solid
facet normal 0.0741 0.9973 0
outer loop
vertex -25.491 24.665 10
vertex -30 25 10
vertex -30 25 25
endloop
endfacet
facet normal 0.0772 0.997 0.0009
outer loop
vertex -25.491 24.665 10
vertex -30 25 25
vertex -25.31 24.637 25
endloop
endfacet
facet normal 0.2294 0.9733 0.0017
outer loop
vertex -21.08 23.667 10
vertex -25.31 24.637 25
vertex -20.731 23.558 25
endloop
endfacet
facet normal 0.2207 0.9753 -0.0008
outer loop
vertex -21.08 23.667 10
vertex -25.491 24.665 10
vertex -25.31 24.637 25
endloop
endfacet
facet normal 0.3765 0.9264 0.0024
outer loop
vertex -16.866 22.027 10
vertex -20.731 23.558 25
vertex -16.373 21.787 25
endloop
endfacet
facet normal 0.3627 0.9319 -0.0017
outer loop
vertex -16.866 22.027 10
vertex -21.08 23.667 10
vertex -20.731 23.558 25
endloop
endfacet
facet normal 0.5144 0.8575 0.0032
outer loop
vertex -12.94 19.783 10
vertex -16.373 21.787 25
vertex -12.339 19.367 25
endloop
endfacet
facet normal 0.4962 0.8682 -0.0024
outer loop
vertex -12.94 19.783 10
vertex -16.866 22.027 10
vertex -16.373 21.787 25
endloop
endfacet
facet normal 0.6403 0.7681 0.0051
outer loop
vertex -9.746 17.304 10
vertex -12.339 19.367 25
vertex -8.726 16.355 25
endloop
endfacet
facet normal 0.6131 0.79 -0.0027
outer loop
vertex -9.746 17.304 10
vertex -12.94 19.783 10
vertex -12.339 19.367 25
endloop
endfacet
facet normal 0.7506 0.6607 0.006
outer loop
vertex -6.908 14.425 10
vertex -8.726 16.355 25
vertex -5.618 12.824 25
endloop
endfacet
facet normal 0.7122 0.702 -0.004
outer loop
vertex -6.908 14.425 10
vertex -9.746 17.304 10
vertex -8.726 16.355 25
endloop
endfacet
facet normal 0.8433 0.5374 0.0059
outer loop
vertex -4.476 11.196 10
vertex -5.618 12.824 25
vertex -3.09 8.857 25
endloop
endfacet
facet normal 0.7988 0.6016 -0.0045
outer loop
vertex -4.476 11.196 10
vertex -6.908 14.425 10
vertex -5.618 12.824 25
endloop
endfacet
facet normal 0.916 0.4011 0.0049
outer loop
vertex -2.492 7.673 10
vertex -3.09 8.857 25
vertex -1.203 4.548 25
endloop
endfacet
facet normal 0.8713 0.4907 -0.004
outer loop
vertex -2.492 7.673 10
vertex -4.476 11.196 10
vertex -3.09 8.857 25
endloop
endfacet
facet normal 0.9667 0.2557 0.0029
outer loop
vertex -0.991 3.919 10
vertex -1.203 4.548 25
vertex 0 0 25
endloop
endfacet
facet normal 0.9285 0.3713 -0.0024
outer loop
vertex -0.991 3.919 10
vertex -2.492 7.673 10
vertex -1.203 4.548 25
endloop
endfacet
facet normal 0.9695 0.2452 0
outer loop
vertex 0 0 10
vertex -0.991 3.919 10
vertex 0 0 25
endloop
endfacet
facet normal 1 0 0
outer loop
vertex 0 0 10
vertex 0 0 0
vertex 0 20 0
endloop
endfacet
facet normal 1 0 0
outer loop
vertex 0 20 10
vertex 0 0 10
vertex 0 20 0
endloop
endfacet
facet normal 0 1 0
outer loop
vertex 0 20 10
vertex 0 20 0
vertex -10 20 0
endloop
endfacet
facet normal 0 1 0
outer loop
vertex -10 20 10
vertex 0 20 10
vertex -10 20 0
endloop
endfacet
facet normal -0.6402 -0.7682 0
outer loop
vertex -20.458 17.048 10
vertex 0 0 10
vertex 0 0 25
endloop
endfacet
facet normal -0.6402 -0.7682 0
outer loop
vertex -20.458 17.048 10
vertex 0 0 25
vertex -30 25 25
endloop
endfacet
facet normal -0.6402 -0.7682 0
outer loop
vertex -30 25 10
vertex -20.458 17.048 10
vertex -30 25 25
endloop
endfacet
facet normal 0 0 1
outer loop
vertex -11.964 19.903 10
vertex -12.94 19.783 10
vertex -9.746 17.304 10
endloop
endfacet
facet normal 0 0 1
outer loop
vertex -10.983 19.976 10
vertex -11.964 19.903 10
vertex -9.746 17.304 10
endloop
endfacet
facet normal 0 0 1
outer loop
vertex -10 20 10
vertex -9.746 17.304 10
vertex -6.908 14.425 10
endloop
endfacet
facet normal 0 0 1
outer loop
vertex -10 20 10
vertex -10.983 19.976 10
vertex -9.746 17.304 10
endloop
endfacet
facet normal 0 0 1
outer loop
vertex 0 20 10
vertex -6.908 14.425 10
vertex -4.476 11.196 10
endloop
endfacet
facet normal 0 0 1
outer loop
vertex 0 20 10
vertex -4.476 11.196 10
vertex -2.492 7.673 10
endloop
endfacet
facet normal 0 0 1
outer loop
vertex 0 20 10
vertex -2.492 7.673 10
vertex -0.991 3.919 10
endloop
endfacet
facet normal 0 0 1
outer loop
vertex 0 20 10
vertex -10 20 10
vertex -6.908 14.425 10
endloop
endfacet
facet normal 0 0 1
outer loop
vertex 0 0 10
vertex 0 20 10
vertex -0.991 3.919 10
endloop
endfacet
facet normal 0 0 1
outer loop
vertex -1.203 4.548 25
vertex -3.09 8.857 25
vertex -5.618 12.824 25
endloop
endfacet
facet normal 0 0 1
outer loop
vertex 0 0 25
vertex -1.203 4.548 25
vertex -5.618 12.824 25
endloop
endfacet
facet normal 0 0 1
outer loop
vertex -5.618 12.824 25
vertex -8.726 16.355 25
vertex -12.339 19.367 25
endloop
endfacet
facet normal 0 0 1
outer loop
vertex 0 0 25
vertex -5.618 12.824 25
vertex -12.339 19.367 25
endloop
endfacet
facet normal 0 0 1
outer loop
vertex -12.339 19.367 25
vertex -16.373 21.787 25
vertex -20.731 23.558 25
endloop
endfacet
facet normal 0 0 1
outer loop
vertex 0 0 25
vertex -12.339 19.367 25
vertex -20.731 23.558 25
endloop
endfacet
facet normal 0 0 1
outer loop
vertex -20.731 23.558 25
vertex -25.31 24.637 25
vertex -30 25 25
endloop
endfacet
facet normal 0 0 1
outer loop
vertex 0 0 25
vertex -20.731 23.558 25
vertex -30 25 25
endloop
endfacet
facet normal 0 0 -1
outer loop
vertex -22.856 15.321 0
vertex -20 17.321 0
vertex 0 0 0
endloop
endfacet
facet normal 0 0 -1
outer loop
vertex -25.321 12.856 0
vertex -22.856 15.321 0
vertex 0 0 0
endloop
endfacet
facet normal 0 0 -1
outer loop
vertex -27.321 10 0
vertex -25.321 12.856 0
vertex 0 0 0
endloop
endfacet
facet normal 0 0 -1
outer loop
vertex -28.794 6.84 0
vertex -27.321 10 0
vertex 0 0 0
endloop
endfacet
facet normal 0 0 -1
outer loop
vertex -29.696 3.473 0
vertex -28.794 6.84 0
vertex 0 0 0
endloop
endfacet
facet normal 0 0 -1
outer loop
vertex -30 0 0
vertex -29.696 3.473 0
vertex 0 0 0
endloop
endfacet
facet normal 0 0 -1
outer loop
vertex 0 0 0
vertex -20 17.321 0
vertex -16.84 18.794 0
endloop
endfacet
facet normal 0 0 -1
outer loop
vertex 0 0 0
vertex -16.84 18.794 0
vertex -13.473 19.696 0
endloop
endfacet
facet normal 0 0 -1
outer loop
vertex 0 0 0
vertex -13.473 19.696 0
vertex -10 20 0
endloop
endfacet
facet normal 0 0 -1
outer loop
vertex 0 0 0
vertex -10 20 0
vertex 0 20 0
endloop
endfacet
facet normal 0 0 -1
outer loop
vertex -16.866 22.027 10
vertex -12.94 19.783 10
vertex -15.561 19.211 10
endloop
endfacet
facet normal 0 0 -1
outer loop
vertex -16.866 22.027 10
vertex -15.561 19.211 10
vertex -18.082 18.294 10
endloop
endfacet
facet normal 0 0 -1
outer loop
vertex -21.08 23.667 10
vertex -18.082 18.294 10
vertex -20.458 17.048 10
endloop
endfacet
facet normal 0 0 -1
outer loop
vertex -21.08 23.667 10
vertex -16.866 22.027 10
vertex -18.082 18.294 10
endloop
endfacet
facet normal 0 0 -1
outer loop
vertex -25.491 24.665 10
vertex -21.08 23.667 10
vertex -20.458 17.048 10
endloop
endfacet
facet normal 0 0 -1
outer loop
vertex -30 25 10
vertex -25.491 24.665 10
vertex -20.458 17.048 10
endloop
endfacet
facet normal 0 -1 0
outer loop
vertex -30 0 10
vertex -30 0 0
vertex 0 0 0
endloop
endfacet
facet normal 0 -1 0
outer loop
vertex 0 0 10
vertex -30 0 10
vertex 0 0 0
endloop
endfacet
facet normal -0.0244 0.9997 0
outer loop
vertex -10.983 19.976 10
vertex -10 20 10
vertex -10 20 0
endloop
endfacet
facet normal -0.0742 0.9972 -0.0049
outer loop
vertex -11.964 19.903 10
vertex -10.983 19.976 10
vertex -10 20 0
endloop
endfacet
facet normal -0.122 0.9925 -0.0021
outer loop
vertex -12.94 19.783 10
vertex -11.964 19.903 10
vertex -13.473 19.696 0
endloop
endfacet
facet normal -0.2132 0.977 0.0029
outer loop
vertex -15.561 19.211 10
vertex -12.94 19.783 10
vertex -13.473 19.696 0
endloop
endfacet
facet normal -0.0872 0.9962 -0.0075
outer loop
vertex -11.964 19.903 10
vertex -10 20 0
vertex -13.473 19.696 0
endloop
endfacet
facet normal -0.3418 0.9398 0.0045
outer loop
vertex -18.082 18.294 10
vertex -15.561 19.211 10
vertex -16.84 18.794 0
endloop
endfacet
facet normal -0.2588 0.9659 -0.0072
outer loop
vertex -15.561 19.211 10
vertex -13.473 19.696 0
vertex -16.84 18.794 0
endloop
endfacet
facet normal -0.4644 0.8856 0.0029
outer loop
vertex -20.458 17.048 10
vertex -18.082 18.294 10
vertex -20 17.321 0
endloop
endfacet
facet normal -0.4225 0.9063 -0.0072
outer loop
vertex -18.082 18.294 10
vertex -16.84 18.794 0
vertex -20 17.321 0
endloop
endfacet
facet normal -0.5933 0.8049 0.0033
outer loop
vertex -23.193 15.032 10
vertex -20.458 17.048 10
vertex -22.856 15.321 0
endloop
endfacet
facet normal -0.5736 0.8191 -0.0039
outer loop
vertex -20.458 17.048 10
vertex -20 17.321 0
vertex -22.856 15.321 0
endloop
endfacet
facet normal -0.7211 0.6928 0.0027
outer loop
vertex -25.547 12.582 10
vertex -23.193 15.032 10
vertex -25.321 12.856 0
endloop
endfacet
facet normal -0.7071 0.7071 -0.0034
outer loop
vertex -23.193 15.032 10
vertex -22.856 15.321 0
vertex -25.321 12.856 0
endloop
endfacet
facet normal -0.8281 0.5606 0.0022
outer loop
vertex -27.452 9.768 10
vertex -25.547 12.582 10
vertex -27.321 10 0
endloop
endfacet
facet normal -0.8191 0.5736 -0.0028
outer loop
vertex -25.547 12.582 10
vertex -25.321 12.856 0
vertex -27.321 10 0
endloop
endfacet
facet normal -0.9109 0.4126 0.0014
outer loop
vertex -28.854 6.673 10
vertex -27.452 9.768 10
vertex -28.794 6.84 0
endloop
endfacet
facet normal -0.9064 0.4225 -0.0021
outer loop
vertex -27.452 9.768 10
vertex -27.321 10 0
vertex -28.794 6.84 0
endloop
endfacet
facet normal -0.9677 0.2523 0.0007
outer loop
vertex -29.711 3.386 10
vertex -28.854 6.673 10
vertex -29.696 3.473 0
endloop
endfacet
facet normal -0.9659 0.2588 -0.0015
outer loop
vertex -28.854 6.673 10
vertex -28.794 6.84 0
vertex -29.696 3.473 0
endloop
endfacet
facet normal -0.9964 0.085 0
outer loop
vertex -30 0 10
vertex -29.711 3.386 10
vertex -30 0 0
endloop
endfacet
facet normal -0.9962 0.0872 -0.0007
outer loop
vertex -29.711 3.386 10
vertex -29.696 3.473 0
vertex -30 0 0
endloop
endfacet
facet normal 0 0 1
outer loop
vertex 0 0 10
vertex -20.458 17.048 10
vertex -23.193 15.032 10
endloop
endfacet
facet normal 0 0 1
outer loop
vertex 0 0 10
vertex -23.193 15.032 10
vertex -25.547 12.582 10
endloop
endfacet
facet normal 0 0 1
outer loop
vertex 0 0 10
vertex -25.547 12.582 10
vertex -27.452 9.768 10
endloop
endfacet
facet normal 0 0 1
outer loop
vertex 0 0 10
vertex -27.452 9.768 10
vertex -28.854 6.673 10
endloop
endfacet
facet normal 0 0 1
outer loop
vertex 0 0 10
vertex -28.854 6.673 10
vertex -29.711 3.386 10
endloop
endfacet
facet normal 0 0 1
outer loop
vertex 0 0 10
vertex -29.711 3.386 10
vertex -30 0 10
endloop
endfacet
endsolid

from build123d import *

# Parameters (mm, degrees)
BOSS_EXTRUDE1_DEPTH = 10
BOSS_EXTRUDE2_DEPTH = 15


with BuildPart() as part:
    # Sketch1 → Boss-Extrude1 (new body)
    with BuildSketch(Plane.XY):
        with BuildLine():
            Line((-30, 0), (0, 0))
            Line((0, 0), (0, 20))
            Line((0, 20), (-10, 20))
            ThreePointArc((-10, 20), (-24.142135624, 14.142135624), (-30, 0))
        make_face()
    extrude(amount=BOSS_EXTRUDE1_DEPTH)

    # Sketch2 → Boss-Extrude2 (add)
    with BuildSketch(Plane.XY.offset(10)):
        with BuildLine():
            Line((0, 0), (-30, 25))
            ThreePointArc((-30, 25), (-10.47437581, 17.930749028), (0, 0))
        make_face()
    extrude(amount=BOSS_EXTRUDE2_DEPTH)


solid = part.part
